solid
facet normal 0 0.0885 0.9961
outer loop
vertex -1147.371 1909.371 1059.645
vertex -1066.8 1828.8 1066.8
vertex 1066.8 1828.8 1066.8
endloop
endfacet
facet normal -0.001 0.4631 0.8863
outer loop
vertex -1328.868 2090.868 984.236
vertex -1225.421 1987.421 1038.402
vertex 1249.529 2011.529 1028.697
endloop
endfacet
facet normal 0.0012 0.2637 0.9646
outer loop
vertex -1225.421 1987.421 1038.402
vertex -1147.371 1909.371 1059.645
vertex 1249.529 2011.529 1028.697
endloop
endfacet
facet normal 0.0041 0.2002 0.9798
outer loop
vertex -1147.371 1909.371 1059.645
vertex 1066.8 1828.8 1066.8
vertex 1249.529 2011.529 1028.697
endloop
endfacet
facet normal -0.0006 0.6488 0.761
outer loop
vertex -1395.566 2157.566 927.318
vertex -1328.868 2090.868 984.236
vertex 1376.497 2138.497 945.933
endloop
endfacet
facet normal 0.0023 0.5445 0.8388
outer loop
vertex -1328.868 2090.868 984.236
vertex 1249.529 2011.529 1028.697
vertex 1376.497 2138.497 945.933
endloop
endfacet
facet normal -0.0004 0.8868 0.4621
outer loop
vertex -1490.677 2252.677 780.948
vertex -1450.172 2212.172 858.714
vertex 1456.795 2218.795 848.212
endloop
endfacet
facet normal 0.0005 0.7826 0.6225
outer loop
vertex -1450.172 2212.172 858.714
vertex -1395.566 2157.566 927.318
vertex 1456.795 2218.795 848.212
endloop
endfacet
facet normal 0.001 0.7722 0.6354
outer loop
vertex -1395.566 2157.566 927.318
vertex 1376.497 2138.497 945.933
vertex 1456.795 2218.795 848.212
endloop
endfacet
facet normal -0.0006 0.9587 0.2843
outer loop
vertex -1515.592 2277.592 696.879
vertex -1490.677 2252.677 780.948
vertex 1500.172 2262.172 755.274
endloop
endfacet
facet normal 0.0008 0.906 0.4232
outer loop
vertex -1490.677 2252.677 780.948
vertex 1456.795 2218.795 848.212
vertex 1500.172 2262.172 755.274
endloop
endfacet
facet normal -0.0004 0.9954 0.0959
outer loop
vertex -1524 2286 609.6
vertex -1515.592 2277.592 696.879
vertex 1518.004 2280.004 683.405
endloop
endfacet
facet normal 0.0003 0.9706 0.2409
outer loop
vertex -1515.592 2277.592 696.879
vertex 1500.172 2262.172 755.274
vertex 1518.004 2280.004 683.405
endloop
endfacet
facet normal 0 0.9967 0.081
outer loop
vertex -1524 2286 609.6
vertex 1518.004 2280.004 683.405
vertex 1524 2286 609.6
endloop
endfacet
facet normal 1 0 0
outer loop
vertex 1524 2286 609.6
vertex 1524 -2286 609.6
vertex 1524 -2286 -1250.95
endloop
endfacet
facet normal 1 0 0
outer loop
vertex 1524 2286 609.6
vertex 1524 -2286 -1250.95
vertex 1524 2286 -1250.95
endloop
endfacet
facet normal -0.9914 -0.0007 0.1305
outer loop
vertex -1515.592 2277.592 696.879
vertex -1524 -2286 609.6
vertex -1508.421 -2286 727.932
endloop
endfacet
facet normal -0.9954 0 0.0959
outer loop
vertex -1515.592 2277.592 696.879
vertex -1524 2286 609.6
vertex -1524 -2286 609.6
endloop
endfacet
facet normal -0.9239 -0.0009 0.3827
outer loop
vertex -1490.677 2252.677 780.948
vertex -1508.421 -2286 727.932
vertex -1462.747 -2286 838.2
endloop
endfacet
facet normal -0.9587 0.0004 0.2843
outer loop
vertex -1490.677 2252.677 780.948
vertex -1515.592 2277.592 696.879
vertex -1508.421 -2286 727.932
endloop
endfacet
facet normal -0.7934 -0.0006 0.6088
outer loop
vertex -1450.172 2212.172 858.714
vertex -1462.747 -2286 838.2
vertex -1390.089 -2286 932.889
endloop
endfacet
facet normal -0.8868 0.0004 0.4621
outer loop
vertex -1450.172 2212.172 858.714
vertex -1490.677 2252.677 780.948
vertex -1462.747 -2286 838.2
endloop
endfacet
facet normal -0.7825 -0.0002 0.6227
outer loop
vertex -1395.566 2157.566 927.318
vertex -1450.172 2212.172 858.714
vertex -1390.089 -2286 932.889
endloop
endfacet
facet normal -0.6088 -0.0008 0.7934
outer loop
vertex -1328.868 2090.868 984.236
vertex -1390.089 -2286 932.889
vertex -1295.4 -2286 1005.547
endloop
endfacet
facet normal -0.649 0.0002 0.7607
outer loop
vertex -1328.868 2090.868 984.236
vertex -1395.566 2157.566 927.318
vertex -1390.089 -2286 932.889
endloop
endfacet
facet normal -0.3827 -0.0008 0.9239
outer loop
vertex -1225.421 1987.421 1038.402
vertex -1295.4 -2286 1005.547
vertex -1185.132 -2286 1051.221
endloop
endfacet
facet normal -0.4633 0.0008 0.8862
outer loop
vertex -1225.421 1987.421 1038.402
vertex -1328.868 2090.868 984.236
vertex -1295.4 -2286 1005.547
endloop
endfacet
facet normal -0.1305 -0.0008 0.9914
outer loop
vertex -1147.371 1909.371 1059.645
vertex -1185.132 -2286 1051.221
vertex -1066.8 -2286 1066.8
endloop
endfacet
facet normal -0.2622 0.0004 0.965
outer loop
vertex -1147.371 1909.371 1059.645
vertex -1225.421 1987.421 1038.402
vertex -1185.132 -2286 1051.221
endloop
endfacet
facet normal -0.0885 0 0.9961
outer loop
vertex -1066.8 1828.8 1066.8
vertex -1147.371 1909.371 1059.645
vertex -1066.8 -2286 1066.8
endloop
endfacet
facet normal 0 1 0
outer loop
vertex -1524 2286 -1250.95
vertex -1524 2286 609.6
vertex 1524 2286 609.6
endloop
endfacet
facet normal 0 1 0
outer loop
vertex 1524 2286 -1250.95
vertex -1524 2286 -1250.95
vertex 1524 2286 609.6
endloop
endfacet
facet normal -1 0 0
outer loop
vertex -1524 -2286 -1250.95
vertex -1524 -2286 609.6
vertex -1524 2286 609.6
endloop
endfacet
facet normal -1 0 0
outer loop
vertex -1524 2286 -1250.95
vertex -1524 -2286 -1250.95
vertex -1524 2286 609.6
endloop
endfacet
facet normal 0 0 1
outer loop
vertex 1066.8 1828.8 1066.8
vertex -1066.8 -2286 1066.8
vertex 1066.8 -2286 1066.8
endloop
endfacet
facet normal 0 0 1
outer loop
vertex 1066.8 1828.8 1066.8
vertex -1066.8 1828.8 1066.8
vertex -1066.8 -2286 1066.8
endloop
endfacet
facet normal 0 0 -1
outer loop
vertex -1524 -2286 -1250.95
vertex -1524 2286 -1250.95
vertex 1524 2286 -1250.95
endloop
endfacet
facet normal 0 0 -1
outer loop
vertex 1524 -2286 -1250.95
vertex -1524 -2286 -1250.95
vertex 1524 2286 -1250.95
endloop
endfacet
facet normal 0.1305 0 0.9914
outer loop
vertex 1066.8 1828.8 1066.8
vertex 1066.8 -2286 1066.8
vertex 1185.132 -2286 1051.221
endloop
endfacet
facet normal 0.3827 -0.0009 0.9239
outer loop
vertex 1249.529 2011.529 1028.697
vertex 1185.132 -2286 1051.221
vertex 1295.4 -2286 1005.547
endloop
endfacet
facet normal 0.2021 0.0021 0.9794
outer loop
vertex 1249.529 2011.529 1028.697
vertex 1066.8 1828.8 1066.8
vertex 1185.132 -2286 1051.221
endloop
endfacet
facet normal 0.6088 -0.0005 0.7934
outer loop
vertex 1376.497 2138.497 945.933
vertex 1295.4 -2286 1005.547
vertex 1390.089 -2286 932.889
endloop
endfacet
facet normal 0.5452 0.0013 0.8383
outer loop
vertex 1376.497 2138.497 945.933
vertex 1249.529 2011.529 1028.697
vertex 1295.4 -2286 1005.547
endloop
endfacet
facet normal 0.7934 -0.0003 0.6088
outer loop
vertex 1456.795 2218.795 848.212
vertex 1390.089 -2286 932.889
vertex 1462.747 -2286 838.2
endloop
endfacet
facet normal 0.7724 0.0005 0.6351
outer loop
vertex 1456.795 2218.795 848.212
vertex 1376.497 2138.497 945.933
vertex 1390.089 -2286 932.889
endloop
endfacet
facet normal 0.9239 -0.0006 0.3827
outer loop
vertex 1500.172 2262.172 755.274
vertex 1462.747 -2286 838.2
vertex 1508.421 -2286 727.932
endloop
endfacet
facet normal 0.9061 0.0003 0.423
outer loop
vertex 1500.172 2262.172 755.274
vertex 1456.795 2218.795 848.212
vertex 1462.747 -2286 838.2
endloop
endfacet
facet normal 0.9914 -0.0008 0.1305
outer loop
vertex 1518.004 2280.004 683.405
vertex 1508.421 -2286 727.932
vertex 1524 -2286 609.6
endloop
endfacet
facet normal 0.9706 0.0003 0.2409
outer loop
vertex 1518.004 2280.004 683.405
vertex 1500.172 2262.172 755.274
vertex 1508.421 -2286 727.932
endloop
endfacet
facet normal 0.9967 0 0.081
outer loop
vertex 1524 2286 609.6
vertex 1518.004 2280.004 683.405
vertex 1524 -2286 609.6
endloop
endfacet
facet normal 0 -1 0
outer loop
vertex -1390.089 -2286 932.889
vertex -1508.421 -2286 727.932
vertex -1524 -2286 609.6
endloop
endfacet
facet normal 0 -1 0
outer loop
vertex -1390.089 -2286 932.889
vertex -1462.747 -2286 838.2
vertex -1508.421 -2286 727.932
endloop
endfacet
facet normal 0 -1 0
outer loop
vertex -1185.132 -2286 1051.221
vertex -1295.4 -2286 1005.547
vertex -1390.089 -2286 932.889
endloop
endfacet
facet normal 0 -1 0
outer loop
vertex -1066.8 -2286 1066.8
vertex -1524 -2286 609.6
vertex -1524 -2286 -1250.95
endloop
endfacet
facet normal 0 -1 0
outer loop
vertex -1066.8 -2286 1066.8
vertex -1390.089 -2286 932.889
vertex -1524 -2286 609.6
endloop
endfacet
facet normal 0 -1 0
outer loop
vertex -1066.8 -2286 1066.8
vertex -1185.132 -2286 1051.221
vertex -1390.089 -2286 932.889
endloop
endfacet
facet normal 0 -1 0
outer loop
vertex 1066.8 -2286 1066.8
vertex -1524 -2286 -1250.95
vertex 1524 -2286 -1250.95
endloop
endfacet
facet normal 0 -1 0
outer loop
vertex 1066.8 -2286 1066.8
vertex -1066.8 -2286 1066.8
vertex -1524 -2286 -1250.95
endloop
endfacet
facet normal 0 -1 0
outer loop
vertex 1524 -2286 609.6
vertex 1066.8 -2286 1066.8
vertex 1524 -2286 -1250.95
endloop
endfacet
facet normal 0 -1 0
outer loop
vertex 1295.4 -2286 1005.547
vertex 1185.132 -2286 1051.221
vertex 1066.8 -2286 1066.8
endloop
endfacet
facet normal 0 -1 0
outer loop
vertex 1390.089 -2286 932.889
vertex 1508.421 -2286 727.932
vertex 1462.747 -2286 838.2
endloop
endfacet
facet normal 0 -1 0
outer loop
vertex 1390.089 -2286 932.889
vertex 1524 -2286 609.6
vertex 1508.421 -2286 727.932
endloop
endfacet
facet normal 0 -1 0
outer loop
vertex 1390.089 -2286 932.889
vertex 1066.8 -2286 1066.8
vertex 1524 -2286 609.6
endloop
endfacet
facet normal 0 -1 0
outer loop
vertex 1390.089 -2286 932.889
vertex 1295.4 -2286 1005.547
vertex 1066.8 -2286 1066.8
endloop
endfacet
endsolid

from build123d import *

# Parameters (mm, degrees)
F0_W     = 3048
F0_H     = 4572
F1_DEPTH = 1066.8
F2_DEPTH = 152.4
F3_DEPTH = 25.4
F4_DEPTH = 6.35
F5_R     = 457.2


with BuildPart() as f1:
    # F0 (on Top) → F1 (new body, symmetric)
    with BuildSketch(Plane.XY):
        Rectangle(F0_W, F0_H)
    extrude(amount=F1_DEPTH, both=True)

    # F2 (add, symmetric): a face of the model
    f2_faces = [f1.faces().sort_by_distance(p)[0] for p in [
        (0, 0, -1066.8),
    ]]
    extrude(f2_faces, amount=F2_DEPTH, both=True)

    # F3 (add, symmetric): a face of the model
    f3_faces = [f1.faces().sort_by_distance(p)[0] for p in [
        (0, 0, -1219.2),
    ]]
    extrude(f3_faces, amount=F3_DEPTH, both=True)

    # F4 (add, symmetric): a face of the model
    f4_faces = [f1.faces().sort_by_distance(p)[0] for p in [
        (0, 0, -1244.6),
    ]]
    extrude(f4_faces, amount=F4_DEPTH, both=True)

    # F5
    f5_edges = [f1.edges().sort_by_distance(p)[0] for p in [
        (-1524, 0, 1066.8),
        (1524, 0, 1066.8),
        (0, 2286, 1066.8),
    ]]
    fillet(f5_edges, radius=F5_R)


solid = f1.part
